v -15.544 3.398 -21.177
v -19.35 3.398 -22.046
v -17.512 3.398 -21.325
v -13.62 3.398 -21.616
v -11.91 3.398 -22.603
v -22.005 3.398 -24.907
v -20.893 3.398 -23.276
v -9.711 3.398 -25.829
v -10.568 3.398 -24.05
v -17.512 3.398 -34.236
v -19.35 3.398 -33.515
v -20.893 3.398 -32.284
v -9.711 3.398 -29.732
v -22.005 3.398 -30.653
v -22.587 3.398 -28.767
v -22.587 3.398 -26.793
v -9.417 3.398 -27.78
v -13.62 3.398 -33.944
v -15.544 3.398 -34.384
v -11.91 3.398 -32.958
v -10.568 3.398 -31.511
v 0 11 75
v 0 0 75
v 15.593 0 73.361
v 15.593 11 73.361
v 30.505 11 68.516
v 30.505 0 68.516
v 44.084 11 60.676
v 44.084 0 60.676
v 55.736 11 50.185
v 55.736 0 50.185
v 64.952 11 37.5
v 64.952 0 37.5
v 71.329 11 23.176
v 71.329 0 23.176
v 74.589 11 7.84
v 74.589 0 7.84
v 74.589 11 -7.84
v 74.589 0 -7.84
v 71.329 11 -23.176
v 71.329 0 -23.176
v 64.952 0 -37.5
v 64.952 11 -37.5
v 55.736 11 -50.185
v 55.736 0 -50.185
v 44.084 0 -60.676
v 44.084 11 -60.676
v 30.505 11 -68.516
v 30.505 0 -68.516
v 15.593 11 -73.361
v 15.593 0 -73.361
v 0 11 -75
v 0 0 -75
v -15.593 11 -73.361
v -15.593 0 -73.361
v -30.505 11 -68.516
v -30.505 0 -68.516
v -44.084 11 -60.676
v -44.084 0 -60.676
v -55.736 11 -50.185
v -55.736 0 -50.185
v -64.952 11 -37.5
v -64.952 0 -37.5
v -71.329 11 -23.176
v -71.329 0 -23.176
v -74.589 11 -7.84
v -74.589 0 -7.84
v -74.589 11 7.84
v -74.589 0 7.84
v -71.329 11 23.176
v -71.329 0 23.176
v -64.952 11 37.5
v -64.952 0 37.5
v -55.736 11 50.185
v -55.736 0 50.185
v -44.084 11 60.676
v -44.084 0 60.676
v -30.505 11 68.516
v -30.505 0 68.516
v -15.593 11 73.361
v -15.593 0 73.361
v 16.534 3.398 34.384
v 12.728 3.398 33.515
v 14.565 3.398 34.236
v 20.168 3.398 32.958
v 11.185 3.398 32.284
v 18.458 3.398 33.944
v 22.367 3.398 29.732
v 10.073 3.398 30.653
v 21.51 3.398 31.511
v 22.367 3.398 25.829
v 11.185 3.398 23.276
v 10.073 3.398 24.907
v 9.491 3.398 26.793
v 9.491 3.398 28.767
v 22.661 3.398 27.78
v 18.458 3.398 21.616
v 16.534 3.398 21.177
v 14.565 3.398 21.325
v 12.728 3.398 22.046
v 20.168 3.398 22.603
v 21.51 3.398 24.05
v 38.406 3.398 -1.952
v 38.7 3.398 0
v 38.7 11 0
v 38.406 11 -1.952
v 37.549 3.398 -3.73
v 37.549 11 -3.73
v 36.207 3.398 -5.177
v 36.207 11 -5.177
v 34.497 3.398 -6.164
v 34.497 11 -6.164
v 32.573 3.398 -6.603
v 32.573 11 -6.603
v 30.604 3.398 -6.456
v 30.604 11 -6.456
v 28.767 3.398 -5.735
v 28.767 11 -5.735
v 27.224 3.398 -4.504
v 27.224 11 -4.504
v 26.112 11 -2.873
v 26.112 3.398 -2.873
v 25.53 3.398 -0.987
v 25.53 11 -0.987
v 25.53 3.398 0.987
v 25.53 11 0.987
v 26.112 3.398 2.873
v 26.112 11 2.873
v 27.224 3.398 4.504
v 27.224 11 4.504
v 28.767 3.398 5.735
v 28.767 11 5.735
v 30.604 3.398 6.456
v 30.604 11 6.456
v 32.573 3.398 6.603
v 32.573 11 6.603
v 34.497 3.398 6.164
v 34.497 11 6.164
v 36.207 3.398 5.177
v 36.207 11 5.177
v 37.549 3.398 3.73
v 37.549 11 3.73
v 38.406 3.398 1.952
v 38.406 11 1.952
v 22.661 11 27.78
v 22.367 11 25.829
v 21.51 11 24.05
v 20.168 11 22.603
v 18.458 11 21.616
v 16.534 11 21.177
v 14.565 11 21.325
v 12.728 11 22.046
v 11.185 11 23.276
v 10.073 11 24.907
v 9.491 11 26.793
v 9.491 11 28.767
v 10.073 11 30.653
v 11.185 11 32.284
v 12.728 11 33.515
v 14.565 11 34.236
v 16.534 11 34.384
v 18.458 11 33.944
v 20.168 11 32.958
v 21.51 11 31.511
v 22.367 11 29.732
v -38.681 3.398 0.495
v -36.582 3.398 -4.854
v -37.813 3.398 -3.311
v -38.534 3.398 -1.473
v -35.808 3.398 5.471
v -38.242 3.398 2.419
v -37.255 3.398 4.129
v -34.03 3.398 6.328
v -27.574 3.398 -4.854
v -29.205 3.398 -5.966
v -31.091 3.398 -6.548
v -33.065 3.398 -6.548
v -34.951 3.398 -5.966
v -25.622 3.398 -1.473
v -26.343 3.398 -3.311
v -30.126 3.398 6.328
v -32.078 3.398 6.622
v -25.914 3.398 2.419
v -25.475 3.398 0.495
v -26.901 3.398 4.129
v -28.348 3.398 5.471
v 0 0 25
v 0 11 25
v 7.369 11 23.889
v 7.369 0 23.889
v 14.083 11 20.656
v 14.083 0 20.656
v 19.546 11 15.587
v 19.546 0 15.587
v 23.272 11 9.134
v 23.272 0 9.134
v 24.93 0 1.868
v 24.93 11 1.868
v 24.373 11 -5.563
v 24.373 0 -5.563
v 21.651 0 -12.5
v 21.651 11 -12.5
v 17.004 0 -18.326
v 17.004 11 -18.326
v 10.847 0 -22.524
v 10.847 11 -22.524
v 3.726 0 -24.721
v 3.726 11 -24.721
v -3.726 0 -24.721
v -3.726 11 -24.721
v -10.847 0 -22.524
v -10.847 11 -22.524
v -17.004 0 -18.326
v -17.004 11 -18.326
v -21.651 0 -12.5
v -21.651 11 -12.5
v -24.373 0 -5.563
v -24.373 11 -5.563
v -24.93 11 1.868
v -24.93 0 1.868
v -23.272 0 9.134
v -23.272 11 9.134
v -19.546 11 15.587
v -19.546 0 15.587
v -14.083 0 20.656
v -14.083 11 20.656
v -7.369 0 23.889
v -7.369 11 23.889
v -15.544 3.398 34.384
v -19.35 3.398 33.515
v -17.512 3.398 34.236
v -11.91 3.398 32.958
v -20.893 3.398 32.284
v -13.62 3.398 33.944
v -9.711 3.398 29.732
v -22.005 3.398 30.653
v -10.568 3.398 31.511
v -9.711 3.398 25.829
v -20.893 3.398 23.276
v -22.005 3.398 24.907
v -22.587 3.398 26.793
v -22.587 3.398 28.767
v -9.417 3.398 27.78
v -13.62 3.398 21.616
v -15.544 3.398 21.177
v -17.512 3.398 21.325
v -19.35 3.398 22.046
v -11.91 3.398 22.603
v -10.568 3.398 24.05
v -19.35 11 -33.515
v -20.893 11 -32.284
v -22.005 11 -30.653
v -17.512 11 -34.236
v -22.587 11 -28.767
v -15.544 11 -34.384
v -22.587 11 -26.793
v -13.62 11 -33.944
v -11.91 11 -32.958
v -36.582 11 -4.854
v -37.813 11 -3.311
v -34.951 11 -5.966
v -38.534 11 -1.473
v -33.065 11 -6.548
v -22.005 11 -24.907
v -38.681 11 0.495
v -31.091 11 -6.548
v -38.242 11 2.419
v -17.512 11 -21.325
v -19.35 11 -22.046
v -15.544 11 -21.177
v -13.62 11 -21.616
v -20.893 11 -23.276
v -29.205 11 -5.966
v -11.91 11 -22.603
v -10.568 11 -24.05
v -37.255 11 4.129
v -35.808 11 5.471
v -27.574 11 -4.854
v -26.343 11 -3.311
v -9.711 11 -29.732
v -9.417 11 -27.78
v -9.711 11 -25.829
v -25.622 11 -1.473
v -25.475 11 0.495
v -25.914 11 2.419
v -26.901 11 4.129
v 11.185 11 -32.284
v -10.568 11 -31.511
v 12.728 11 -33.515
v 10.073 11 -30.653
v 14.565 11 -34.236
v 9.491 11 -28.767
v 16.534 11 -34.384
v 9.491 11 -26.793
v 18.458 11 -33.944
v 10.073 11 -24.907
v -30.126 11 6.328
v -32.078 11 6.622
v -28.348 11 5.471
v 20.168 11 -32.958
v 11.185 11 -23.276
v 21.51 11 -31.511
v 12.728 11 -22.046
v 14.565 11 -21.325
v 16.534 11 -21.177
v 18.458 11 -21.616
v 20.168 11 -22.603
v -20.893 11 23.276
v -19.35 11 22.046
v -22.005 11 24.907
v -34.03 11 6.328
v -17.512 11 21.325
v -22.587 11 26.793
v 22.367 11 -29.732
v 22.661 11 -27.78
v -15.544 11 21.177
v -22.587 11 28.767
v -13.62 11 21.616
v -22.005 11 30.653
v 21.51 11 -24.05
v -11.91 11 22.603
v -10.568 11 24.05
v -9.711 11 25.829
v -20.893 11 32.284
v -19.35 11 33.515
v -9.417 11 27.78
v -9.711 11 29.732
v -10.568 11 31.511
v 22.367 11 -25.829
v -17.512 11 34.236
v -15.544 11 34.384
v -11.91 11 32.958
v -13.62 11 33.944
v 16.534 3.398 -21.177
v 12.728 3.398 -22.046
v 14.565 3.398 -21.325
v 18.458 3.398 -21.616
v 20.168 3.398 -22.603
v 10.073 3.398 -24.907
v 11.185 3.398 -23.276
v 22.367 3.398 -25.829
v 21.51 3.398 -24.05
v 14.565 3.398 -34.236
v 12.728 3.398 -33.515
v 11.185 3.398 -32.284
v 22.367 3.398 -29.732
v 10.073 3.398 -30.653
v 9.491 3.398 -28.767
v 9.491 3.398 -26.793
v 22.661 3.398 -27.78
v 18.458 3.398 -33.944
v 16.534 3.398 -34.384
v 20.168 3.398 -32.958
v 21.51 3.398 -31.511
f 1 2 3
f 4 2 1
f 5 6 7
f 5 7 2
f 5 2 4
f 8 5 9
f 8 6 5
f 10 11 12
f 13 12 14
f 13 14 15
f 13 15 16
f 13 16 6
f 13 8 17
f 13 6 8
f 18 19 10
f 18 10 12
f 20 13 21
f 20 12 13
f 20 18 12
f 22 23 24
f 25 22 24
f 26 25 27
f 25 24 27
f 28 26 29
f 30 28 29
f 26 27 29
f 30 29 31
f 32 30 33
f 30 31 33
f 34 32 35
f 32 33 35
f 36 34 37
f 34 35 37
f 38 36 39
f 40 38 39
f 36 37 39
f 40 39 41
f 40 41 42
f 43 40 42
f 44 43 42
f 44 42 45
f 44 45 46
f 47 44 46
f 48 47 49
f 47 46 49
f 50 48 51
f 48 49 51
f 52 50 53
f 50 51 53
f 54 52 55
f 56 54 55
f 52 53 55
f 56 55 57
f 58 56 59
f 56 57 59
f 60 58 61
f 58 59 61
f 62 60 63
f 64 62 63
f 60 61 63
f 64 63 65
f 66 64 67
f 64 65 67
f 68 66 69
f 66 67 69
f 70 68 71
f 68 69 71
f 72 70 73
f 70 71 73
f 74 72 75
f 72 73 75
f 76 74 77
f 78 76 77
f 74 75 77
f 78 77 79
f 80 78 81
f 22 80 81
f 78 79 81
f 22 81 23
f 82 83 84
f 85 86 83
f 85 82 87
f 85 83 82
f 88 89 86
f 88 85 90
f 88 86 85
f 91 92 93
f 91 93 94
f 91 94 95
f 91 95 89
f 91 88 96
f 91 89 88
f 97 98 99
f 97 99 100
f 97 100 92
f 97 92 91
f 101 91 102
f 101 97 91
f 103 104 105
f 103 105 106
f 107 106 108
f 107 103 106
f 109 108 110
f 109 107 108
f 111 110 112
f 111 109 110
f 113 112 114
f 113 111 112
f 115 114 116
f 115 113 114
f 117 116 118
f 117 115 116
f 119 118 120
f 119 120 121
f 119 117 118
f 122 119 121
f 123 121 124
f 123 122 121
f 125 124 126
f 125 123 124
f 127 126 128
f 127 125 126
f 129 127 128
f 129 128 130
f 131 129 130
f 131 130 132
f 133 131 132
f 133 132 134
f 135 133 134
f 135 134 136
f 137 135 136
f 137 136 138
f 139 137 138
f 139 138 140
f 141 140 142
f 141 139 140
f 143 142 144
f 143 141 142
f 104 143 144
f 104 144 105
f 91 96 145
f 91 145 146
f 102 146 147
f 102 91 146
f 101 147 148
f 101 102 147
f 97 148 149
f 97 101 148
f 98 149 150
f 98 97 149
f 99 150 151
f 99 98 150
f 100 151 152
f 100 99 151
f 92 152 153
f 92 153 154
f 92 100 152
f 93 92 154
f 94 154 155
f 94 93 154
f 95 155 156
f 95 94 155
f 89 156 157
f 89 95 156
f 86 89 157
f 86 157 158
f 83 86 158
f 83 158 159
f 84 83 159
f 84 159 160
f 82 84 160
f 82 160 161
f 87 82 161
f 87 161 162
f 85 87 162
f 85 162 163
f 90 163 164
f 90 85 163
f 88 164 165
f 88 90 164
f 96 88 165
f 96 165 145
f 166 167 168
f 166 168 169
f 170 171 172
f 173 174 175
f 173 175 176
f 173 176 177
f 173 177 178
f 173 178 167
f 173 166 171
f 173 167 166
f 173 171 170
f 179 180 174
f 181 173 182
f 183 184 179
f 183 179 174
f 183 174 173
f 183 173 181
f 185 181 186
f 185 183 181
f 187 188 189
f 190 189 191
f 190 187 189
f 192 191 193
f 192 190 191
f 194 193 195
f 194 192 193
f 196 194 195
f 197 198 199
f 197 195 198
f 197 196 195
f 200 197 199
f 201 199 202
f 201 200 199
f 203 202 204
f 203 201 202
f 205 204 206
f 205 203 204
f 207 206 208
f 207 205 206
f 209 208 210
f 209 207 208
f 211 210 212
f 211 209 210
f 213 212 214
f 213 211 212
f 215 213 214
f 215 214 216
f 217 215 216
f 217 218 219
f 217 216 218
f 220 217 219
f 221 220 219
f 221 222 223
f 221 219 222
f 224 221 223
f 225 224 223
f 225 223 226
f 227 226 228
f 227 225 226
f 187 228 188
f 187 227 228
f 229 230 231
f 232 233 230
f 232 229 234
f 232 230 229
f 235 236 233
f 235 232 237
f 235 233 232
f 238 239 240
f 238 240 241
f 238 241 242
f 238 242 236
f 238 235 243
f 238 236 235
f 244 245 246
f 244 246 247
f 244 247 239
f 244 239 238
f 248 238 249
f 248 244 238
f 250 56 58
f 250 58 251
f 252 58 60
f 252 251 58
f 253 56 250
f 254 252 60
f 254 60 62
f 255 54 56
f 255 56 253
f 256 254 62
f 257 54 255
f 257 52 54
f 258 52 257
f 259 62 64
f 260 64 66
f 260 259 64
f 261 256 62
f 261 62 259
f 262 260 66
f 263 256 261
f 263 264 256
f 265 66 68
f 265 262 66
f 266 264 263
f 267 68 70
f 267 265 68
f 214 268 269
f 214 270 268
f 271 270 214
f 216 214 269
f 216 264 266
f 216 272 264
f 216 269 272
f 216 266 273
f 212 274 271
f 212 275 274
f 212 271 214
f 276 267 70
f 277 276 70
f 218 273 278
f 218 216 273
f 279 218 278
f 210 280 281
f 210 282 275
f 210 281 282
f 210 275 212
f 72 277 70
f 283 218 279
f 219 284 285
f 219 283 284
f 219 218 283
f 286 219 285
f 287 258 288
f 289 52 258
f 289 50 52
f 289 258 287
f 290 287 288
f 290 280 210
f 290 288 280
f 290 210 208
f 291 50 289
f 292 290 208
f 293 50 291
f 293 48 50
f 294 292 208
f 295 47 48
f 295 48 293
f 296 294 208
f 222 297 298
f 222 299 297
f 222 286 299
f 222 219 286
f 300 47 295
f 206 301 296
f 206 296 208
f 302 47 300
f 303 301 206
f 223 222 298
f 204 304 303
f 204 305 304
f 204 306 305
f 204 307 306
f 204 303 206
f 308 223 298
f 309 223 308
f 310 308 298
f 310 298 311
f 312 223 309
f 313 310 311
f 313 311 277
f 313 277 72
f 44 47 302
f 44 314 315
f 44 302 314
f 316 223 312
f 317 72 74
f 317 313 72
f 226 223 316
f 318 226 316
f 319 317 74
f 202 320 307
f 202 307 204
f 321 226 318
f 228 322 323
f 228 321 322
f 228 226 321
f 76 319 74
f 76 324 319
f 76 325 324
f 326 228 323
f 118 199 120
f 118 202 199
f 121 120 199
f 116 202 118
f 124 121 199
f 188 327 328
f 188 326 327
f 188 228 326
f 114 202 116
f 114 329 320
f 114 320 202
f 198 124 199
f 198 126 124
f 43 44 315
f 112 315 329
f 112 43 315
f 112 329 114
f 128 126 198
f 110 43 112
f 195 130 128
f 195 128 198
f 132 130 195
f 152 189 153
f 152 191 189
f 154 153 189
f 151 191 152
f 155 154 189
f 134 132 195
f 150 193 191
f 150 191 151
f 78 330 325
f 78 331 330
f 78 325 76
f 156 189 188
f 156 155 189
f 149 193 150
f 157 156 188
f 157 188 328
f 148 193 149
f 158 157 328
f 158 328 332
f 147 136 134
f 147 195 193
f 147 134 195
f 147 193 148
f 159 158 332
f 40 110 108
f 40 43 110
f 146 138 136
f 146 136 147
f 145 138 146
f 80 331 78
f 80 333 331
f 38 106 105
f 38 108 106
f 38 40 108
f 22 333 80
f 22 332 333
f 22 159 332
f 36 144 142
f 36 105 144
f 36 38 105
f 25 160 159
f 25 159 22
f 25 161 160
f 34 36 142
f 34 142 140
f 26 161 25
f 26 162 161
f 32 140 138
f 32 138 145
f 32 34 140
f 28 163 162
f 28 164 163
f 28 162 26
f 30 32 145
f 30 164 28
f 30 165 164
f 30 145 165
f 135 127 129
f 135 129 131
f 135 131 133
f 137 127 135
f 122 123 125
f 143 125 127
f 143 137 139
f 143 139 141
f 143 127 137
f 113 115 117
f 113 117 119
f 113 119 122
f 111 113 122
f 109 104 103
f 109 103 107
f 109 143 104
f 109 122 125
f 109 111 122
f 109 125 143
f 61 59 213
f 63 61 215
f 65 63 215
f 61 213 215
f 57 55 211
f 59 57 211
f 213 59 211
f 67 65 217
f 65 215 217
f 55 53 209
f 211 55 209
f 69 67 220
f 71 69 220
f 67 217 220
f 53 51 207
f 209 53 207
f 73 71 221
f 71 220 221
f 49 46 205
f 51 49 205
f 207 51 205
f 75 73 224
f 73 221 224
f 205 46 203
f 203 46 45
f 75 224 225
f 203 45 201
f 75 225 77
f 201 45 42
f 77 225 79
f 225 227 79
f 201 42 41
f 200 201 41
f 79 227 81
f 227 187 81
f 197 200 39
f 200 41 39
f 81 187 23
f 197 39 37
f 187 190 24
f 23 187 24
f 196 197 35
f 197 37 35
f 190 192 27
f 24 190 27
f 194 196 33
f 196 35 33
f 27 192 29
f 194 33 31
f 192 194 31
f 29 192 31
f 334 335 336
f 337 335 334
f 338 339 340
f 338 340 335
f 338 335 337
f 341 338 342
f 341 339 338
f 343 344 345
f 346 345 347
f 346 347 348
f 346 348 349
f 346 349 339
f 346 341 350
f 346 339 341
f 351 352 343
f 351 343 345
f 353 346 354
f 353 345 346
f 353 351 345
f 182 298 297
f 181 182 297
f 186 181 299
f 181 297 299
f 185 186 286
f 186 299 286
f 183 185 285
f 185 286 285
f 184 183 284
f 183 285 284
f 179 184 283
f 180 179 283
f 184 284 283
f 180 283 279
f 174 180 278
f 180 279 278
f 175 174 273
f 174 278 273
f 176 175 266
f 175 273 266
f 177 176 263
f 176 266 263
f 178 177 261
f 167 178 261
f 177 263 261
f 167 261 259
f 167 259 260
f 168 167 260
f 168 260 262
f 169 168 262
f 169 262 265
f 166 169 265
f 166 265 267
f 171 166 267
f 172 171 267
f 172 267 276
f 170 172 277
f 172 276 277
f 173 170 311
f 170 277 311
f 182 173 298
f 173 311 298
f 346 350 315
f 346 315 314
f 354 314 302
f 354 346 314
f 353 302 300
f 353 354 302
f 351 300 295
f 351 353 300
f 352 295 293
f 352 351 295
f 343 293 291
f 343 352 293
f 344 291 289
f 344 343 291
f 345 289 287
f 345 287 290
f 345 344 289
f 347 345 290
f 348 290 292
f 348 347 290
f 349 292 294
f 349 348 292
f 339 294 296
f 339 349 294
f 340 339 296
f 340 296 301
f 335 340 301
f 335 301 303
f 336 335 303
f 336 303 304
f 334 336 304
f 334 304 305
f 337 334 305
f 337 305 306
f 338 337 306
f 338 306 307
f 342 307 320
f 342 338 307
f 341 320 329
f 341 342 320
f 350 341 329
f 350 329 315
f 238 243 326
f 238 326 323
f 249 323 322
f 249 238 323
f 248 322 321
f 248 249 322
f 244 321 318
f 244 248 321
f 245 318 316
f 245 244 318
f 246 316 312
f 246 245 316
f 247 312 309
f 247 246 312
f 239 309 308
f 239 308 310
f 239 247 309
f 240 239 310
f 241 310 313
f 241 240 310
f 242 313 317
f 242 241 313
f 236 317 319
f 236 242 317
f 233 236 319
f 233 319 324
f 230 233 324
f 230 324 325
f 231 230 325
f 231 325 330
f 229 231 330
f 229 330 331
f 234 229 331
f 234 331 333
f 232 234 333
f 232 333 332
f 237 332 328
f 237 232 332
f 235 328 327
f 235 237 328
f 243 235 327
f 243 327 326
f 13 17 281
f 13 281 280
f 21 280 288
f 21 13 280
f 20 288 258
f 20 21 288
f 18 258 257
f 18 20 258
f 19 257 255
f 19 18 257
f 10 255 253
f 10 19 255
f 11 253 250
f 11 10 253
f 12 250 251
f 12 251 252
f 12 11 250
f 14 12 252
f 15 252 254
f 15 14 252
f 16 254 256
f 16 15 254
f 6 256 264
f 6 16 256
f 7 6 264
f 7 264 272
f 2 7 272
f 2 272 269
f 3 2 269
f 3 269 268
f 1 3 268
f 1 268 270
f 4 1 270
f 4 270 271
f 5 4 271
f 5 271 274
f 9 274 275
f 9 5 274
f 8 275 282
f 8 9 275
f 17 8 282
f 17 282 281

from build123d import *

# Parameters (mm, degrees)
SKETCH1_R           = 75
BOSS_EXTRUDE1_DEPTH = 11
SKETCH2_R           = 25
CUT_EXTRUDE1_DEPTH  = 107.6348911
SKETCH3_R           = 6.621835616
CUT_EXTRUDE2_DEPTH  = 7.602484305
CIRPATTERN1_COUNT   = 6


with BuildPart() as part:
    # Sketch1 → Boss-Extrude1 (new body)
    with BuildSketch(Plane(origin=(0, 0, 0), x_dir=(1, 0, 0), z_dir=(0, 1, 0))):
        Circle(SKETCH1_R)
    extrude(amount=BOSS_EXTRUDE1_DEPTH)

    # Sketch2 → Cut-Extrude1 (cut, through all)
    with BuildSketch(Plane(origin=(0, 0, 0), x_dir=(1, 0, 0), z_dir=(0, 1, 0))):
        Circle(SKETCH2_R)
    extrude(amount=CUT_EXTRUDE1_DEPTH, mode=Mode.SUBTRACT)

    # Sketch3 → Cut-Extrude2 (cut)
    with BuildSketch(Plane(origin=(0, 11, 0), x_dir=(1, 0, 0), z_dir=(0, 1, 0))):
        with Locations((-32.077977474, 0)):
            Circle(SKETCH3_R)
    cut_extrude2 = extrude(amount=-CUT_EXTRUDE2_DEPTH, mode=Mode.SUBTRACT)

    # CirPattern1: Cut-Extrude2 ×6 about axis
    cirpattern1_axis = Axis((0, 0, 0), (0, 1, 0))
    for i in range(1, CIRPATTERN1_COUNT):
        add(cut_extrude2.rotate(cirpattern1_axis, i * 360 / CIRPATTERN1_COUNT), mode=Mode.SUBTRACT)


solid = part.part
